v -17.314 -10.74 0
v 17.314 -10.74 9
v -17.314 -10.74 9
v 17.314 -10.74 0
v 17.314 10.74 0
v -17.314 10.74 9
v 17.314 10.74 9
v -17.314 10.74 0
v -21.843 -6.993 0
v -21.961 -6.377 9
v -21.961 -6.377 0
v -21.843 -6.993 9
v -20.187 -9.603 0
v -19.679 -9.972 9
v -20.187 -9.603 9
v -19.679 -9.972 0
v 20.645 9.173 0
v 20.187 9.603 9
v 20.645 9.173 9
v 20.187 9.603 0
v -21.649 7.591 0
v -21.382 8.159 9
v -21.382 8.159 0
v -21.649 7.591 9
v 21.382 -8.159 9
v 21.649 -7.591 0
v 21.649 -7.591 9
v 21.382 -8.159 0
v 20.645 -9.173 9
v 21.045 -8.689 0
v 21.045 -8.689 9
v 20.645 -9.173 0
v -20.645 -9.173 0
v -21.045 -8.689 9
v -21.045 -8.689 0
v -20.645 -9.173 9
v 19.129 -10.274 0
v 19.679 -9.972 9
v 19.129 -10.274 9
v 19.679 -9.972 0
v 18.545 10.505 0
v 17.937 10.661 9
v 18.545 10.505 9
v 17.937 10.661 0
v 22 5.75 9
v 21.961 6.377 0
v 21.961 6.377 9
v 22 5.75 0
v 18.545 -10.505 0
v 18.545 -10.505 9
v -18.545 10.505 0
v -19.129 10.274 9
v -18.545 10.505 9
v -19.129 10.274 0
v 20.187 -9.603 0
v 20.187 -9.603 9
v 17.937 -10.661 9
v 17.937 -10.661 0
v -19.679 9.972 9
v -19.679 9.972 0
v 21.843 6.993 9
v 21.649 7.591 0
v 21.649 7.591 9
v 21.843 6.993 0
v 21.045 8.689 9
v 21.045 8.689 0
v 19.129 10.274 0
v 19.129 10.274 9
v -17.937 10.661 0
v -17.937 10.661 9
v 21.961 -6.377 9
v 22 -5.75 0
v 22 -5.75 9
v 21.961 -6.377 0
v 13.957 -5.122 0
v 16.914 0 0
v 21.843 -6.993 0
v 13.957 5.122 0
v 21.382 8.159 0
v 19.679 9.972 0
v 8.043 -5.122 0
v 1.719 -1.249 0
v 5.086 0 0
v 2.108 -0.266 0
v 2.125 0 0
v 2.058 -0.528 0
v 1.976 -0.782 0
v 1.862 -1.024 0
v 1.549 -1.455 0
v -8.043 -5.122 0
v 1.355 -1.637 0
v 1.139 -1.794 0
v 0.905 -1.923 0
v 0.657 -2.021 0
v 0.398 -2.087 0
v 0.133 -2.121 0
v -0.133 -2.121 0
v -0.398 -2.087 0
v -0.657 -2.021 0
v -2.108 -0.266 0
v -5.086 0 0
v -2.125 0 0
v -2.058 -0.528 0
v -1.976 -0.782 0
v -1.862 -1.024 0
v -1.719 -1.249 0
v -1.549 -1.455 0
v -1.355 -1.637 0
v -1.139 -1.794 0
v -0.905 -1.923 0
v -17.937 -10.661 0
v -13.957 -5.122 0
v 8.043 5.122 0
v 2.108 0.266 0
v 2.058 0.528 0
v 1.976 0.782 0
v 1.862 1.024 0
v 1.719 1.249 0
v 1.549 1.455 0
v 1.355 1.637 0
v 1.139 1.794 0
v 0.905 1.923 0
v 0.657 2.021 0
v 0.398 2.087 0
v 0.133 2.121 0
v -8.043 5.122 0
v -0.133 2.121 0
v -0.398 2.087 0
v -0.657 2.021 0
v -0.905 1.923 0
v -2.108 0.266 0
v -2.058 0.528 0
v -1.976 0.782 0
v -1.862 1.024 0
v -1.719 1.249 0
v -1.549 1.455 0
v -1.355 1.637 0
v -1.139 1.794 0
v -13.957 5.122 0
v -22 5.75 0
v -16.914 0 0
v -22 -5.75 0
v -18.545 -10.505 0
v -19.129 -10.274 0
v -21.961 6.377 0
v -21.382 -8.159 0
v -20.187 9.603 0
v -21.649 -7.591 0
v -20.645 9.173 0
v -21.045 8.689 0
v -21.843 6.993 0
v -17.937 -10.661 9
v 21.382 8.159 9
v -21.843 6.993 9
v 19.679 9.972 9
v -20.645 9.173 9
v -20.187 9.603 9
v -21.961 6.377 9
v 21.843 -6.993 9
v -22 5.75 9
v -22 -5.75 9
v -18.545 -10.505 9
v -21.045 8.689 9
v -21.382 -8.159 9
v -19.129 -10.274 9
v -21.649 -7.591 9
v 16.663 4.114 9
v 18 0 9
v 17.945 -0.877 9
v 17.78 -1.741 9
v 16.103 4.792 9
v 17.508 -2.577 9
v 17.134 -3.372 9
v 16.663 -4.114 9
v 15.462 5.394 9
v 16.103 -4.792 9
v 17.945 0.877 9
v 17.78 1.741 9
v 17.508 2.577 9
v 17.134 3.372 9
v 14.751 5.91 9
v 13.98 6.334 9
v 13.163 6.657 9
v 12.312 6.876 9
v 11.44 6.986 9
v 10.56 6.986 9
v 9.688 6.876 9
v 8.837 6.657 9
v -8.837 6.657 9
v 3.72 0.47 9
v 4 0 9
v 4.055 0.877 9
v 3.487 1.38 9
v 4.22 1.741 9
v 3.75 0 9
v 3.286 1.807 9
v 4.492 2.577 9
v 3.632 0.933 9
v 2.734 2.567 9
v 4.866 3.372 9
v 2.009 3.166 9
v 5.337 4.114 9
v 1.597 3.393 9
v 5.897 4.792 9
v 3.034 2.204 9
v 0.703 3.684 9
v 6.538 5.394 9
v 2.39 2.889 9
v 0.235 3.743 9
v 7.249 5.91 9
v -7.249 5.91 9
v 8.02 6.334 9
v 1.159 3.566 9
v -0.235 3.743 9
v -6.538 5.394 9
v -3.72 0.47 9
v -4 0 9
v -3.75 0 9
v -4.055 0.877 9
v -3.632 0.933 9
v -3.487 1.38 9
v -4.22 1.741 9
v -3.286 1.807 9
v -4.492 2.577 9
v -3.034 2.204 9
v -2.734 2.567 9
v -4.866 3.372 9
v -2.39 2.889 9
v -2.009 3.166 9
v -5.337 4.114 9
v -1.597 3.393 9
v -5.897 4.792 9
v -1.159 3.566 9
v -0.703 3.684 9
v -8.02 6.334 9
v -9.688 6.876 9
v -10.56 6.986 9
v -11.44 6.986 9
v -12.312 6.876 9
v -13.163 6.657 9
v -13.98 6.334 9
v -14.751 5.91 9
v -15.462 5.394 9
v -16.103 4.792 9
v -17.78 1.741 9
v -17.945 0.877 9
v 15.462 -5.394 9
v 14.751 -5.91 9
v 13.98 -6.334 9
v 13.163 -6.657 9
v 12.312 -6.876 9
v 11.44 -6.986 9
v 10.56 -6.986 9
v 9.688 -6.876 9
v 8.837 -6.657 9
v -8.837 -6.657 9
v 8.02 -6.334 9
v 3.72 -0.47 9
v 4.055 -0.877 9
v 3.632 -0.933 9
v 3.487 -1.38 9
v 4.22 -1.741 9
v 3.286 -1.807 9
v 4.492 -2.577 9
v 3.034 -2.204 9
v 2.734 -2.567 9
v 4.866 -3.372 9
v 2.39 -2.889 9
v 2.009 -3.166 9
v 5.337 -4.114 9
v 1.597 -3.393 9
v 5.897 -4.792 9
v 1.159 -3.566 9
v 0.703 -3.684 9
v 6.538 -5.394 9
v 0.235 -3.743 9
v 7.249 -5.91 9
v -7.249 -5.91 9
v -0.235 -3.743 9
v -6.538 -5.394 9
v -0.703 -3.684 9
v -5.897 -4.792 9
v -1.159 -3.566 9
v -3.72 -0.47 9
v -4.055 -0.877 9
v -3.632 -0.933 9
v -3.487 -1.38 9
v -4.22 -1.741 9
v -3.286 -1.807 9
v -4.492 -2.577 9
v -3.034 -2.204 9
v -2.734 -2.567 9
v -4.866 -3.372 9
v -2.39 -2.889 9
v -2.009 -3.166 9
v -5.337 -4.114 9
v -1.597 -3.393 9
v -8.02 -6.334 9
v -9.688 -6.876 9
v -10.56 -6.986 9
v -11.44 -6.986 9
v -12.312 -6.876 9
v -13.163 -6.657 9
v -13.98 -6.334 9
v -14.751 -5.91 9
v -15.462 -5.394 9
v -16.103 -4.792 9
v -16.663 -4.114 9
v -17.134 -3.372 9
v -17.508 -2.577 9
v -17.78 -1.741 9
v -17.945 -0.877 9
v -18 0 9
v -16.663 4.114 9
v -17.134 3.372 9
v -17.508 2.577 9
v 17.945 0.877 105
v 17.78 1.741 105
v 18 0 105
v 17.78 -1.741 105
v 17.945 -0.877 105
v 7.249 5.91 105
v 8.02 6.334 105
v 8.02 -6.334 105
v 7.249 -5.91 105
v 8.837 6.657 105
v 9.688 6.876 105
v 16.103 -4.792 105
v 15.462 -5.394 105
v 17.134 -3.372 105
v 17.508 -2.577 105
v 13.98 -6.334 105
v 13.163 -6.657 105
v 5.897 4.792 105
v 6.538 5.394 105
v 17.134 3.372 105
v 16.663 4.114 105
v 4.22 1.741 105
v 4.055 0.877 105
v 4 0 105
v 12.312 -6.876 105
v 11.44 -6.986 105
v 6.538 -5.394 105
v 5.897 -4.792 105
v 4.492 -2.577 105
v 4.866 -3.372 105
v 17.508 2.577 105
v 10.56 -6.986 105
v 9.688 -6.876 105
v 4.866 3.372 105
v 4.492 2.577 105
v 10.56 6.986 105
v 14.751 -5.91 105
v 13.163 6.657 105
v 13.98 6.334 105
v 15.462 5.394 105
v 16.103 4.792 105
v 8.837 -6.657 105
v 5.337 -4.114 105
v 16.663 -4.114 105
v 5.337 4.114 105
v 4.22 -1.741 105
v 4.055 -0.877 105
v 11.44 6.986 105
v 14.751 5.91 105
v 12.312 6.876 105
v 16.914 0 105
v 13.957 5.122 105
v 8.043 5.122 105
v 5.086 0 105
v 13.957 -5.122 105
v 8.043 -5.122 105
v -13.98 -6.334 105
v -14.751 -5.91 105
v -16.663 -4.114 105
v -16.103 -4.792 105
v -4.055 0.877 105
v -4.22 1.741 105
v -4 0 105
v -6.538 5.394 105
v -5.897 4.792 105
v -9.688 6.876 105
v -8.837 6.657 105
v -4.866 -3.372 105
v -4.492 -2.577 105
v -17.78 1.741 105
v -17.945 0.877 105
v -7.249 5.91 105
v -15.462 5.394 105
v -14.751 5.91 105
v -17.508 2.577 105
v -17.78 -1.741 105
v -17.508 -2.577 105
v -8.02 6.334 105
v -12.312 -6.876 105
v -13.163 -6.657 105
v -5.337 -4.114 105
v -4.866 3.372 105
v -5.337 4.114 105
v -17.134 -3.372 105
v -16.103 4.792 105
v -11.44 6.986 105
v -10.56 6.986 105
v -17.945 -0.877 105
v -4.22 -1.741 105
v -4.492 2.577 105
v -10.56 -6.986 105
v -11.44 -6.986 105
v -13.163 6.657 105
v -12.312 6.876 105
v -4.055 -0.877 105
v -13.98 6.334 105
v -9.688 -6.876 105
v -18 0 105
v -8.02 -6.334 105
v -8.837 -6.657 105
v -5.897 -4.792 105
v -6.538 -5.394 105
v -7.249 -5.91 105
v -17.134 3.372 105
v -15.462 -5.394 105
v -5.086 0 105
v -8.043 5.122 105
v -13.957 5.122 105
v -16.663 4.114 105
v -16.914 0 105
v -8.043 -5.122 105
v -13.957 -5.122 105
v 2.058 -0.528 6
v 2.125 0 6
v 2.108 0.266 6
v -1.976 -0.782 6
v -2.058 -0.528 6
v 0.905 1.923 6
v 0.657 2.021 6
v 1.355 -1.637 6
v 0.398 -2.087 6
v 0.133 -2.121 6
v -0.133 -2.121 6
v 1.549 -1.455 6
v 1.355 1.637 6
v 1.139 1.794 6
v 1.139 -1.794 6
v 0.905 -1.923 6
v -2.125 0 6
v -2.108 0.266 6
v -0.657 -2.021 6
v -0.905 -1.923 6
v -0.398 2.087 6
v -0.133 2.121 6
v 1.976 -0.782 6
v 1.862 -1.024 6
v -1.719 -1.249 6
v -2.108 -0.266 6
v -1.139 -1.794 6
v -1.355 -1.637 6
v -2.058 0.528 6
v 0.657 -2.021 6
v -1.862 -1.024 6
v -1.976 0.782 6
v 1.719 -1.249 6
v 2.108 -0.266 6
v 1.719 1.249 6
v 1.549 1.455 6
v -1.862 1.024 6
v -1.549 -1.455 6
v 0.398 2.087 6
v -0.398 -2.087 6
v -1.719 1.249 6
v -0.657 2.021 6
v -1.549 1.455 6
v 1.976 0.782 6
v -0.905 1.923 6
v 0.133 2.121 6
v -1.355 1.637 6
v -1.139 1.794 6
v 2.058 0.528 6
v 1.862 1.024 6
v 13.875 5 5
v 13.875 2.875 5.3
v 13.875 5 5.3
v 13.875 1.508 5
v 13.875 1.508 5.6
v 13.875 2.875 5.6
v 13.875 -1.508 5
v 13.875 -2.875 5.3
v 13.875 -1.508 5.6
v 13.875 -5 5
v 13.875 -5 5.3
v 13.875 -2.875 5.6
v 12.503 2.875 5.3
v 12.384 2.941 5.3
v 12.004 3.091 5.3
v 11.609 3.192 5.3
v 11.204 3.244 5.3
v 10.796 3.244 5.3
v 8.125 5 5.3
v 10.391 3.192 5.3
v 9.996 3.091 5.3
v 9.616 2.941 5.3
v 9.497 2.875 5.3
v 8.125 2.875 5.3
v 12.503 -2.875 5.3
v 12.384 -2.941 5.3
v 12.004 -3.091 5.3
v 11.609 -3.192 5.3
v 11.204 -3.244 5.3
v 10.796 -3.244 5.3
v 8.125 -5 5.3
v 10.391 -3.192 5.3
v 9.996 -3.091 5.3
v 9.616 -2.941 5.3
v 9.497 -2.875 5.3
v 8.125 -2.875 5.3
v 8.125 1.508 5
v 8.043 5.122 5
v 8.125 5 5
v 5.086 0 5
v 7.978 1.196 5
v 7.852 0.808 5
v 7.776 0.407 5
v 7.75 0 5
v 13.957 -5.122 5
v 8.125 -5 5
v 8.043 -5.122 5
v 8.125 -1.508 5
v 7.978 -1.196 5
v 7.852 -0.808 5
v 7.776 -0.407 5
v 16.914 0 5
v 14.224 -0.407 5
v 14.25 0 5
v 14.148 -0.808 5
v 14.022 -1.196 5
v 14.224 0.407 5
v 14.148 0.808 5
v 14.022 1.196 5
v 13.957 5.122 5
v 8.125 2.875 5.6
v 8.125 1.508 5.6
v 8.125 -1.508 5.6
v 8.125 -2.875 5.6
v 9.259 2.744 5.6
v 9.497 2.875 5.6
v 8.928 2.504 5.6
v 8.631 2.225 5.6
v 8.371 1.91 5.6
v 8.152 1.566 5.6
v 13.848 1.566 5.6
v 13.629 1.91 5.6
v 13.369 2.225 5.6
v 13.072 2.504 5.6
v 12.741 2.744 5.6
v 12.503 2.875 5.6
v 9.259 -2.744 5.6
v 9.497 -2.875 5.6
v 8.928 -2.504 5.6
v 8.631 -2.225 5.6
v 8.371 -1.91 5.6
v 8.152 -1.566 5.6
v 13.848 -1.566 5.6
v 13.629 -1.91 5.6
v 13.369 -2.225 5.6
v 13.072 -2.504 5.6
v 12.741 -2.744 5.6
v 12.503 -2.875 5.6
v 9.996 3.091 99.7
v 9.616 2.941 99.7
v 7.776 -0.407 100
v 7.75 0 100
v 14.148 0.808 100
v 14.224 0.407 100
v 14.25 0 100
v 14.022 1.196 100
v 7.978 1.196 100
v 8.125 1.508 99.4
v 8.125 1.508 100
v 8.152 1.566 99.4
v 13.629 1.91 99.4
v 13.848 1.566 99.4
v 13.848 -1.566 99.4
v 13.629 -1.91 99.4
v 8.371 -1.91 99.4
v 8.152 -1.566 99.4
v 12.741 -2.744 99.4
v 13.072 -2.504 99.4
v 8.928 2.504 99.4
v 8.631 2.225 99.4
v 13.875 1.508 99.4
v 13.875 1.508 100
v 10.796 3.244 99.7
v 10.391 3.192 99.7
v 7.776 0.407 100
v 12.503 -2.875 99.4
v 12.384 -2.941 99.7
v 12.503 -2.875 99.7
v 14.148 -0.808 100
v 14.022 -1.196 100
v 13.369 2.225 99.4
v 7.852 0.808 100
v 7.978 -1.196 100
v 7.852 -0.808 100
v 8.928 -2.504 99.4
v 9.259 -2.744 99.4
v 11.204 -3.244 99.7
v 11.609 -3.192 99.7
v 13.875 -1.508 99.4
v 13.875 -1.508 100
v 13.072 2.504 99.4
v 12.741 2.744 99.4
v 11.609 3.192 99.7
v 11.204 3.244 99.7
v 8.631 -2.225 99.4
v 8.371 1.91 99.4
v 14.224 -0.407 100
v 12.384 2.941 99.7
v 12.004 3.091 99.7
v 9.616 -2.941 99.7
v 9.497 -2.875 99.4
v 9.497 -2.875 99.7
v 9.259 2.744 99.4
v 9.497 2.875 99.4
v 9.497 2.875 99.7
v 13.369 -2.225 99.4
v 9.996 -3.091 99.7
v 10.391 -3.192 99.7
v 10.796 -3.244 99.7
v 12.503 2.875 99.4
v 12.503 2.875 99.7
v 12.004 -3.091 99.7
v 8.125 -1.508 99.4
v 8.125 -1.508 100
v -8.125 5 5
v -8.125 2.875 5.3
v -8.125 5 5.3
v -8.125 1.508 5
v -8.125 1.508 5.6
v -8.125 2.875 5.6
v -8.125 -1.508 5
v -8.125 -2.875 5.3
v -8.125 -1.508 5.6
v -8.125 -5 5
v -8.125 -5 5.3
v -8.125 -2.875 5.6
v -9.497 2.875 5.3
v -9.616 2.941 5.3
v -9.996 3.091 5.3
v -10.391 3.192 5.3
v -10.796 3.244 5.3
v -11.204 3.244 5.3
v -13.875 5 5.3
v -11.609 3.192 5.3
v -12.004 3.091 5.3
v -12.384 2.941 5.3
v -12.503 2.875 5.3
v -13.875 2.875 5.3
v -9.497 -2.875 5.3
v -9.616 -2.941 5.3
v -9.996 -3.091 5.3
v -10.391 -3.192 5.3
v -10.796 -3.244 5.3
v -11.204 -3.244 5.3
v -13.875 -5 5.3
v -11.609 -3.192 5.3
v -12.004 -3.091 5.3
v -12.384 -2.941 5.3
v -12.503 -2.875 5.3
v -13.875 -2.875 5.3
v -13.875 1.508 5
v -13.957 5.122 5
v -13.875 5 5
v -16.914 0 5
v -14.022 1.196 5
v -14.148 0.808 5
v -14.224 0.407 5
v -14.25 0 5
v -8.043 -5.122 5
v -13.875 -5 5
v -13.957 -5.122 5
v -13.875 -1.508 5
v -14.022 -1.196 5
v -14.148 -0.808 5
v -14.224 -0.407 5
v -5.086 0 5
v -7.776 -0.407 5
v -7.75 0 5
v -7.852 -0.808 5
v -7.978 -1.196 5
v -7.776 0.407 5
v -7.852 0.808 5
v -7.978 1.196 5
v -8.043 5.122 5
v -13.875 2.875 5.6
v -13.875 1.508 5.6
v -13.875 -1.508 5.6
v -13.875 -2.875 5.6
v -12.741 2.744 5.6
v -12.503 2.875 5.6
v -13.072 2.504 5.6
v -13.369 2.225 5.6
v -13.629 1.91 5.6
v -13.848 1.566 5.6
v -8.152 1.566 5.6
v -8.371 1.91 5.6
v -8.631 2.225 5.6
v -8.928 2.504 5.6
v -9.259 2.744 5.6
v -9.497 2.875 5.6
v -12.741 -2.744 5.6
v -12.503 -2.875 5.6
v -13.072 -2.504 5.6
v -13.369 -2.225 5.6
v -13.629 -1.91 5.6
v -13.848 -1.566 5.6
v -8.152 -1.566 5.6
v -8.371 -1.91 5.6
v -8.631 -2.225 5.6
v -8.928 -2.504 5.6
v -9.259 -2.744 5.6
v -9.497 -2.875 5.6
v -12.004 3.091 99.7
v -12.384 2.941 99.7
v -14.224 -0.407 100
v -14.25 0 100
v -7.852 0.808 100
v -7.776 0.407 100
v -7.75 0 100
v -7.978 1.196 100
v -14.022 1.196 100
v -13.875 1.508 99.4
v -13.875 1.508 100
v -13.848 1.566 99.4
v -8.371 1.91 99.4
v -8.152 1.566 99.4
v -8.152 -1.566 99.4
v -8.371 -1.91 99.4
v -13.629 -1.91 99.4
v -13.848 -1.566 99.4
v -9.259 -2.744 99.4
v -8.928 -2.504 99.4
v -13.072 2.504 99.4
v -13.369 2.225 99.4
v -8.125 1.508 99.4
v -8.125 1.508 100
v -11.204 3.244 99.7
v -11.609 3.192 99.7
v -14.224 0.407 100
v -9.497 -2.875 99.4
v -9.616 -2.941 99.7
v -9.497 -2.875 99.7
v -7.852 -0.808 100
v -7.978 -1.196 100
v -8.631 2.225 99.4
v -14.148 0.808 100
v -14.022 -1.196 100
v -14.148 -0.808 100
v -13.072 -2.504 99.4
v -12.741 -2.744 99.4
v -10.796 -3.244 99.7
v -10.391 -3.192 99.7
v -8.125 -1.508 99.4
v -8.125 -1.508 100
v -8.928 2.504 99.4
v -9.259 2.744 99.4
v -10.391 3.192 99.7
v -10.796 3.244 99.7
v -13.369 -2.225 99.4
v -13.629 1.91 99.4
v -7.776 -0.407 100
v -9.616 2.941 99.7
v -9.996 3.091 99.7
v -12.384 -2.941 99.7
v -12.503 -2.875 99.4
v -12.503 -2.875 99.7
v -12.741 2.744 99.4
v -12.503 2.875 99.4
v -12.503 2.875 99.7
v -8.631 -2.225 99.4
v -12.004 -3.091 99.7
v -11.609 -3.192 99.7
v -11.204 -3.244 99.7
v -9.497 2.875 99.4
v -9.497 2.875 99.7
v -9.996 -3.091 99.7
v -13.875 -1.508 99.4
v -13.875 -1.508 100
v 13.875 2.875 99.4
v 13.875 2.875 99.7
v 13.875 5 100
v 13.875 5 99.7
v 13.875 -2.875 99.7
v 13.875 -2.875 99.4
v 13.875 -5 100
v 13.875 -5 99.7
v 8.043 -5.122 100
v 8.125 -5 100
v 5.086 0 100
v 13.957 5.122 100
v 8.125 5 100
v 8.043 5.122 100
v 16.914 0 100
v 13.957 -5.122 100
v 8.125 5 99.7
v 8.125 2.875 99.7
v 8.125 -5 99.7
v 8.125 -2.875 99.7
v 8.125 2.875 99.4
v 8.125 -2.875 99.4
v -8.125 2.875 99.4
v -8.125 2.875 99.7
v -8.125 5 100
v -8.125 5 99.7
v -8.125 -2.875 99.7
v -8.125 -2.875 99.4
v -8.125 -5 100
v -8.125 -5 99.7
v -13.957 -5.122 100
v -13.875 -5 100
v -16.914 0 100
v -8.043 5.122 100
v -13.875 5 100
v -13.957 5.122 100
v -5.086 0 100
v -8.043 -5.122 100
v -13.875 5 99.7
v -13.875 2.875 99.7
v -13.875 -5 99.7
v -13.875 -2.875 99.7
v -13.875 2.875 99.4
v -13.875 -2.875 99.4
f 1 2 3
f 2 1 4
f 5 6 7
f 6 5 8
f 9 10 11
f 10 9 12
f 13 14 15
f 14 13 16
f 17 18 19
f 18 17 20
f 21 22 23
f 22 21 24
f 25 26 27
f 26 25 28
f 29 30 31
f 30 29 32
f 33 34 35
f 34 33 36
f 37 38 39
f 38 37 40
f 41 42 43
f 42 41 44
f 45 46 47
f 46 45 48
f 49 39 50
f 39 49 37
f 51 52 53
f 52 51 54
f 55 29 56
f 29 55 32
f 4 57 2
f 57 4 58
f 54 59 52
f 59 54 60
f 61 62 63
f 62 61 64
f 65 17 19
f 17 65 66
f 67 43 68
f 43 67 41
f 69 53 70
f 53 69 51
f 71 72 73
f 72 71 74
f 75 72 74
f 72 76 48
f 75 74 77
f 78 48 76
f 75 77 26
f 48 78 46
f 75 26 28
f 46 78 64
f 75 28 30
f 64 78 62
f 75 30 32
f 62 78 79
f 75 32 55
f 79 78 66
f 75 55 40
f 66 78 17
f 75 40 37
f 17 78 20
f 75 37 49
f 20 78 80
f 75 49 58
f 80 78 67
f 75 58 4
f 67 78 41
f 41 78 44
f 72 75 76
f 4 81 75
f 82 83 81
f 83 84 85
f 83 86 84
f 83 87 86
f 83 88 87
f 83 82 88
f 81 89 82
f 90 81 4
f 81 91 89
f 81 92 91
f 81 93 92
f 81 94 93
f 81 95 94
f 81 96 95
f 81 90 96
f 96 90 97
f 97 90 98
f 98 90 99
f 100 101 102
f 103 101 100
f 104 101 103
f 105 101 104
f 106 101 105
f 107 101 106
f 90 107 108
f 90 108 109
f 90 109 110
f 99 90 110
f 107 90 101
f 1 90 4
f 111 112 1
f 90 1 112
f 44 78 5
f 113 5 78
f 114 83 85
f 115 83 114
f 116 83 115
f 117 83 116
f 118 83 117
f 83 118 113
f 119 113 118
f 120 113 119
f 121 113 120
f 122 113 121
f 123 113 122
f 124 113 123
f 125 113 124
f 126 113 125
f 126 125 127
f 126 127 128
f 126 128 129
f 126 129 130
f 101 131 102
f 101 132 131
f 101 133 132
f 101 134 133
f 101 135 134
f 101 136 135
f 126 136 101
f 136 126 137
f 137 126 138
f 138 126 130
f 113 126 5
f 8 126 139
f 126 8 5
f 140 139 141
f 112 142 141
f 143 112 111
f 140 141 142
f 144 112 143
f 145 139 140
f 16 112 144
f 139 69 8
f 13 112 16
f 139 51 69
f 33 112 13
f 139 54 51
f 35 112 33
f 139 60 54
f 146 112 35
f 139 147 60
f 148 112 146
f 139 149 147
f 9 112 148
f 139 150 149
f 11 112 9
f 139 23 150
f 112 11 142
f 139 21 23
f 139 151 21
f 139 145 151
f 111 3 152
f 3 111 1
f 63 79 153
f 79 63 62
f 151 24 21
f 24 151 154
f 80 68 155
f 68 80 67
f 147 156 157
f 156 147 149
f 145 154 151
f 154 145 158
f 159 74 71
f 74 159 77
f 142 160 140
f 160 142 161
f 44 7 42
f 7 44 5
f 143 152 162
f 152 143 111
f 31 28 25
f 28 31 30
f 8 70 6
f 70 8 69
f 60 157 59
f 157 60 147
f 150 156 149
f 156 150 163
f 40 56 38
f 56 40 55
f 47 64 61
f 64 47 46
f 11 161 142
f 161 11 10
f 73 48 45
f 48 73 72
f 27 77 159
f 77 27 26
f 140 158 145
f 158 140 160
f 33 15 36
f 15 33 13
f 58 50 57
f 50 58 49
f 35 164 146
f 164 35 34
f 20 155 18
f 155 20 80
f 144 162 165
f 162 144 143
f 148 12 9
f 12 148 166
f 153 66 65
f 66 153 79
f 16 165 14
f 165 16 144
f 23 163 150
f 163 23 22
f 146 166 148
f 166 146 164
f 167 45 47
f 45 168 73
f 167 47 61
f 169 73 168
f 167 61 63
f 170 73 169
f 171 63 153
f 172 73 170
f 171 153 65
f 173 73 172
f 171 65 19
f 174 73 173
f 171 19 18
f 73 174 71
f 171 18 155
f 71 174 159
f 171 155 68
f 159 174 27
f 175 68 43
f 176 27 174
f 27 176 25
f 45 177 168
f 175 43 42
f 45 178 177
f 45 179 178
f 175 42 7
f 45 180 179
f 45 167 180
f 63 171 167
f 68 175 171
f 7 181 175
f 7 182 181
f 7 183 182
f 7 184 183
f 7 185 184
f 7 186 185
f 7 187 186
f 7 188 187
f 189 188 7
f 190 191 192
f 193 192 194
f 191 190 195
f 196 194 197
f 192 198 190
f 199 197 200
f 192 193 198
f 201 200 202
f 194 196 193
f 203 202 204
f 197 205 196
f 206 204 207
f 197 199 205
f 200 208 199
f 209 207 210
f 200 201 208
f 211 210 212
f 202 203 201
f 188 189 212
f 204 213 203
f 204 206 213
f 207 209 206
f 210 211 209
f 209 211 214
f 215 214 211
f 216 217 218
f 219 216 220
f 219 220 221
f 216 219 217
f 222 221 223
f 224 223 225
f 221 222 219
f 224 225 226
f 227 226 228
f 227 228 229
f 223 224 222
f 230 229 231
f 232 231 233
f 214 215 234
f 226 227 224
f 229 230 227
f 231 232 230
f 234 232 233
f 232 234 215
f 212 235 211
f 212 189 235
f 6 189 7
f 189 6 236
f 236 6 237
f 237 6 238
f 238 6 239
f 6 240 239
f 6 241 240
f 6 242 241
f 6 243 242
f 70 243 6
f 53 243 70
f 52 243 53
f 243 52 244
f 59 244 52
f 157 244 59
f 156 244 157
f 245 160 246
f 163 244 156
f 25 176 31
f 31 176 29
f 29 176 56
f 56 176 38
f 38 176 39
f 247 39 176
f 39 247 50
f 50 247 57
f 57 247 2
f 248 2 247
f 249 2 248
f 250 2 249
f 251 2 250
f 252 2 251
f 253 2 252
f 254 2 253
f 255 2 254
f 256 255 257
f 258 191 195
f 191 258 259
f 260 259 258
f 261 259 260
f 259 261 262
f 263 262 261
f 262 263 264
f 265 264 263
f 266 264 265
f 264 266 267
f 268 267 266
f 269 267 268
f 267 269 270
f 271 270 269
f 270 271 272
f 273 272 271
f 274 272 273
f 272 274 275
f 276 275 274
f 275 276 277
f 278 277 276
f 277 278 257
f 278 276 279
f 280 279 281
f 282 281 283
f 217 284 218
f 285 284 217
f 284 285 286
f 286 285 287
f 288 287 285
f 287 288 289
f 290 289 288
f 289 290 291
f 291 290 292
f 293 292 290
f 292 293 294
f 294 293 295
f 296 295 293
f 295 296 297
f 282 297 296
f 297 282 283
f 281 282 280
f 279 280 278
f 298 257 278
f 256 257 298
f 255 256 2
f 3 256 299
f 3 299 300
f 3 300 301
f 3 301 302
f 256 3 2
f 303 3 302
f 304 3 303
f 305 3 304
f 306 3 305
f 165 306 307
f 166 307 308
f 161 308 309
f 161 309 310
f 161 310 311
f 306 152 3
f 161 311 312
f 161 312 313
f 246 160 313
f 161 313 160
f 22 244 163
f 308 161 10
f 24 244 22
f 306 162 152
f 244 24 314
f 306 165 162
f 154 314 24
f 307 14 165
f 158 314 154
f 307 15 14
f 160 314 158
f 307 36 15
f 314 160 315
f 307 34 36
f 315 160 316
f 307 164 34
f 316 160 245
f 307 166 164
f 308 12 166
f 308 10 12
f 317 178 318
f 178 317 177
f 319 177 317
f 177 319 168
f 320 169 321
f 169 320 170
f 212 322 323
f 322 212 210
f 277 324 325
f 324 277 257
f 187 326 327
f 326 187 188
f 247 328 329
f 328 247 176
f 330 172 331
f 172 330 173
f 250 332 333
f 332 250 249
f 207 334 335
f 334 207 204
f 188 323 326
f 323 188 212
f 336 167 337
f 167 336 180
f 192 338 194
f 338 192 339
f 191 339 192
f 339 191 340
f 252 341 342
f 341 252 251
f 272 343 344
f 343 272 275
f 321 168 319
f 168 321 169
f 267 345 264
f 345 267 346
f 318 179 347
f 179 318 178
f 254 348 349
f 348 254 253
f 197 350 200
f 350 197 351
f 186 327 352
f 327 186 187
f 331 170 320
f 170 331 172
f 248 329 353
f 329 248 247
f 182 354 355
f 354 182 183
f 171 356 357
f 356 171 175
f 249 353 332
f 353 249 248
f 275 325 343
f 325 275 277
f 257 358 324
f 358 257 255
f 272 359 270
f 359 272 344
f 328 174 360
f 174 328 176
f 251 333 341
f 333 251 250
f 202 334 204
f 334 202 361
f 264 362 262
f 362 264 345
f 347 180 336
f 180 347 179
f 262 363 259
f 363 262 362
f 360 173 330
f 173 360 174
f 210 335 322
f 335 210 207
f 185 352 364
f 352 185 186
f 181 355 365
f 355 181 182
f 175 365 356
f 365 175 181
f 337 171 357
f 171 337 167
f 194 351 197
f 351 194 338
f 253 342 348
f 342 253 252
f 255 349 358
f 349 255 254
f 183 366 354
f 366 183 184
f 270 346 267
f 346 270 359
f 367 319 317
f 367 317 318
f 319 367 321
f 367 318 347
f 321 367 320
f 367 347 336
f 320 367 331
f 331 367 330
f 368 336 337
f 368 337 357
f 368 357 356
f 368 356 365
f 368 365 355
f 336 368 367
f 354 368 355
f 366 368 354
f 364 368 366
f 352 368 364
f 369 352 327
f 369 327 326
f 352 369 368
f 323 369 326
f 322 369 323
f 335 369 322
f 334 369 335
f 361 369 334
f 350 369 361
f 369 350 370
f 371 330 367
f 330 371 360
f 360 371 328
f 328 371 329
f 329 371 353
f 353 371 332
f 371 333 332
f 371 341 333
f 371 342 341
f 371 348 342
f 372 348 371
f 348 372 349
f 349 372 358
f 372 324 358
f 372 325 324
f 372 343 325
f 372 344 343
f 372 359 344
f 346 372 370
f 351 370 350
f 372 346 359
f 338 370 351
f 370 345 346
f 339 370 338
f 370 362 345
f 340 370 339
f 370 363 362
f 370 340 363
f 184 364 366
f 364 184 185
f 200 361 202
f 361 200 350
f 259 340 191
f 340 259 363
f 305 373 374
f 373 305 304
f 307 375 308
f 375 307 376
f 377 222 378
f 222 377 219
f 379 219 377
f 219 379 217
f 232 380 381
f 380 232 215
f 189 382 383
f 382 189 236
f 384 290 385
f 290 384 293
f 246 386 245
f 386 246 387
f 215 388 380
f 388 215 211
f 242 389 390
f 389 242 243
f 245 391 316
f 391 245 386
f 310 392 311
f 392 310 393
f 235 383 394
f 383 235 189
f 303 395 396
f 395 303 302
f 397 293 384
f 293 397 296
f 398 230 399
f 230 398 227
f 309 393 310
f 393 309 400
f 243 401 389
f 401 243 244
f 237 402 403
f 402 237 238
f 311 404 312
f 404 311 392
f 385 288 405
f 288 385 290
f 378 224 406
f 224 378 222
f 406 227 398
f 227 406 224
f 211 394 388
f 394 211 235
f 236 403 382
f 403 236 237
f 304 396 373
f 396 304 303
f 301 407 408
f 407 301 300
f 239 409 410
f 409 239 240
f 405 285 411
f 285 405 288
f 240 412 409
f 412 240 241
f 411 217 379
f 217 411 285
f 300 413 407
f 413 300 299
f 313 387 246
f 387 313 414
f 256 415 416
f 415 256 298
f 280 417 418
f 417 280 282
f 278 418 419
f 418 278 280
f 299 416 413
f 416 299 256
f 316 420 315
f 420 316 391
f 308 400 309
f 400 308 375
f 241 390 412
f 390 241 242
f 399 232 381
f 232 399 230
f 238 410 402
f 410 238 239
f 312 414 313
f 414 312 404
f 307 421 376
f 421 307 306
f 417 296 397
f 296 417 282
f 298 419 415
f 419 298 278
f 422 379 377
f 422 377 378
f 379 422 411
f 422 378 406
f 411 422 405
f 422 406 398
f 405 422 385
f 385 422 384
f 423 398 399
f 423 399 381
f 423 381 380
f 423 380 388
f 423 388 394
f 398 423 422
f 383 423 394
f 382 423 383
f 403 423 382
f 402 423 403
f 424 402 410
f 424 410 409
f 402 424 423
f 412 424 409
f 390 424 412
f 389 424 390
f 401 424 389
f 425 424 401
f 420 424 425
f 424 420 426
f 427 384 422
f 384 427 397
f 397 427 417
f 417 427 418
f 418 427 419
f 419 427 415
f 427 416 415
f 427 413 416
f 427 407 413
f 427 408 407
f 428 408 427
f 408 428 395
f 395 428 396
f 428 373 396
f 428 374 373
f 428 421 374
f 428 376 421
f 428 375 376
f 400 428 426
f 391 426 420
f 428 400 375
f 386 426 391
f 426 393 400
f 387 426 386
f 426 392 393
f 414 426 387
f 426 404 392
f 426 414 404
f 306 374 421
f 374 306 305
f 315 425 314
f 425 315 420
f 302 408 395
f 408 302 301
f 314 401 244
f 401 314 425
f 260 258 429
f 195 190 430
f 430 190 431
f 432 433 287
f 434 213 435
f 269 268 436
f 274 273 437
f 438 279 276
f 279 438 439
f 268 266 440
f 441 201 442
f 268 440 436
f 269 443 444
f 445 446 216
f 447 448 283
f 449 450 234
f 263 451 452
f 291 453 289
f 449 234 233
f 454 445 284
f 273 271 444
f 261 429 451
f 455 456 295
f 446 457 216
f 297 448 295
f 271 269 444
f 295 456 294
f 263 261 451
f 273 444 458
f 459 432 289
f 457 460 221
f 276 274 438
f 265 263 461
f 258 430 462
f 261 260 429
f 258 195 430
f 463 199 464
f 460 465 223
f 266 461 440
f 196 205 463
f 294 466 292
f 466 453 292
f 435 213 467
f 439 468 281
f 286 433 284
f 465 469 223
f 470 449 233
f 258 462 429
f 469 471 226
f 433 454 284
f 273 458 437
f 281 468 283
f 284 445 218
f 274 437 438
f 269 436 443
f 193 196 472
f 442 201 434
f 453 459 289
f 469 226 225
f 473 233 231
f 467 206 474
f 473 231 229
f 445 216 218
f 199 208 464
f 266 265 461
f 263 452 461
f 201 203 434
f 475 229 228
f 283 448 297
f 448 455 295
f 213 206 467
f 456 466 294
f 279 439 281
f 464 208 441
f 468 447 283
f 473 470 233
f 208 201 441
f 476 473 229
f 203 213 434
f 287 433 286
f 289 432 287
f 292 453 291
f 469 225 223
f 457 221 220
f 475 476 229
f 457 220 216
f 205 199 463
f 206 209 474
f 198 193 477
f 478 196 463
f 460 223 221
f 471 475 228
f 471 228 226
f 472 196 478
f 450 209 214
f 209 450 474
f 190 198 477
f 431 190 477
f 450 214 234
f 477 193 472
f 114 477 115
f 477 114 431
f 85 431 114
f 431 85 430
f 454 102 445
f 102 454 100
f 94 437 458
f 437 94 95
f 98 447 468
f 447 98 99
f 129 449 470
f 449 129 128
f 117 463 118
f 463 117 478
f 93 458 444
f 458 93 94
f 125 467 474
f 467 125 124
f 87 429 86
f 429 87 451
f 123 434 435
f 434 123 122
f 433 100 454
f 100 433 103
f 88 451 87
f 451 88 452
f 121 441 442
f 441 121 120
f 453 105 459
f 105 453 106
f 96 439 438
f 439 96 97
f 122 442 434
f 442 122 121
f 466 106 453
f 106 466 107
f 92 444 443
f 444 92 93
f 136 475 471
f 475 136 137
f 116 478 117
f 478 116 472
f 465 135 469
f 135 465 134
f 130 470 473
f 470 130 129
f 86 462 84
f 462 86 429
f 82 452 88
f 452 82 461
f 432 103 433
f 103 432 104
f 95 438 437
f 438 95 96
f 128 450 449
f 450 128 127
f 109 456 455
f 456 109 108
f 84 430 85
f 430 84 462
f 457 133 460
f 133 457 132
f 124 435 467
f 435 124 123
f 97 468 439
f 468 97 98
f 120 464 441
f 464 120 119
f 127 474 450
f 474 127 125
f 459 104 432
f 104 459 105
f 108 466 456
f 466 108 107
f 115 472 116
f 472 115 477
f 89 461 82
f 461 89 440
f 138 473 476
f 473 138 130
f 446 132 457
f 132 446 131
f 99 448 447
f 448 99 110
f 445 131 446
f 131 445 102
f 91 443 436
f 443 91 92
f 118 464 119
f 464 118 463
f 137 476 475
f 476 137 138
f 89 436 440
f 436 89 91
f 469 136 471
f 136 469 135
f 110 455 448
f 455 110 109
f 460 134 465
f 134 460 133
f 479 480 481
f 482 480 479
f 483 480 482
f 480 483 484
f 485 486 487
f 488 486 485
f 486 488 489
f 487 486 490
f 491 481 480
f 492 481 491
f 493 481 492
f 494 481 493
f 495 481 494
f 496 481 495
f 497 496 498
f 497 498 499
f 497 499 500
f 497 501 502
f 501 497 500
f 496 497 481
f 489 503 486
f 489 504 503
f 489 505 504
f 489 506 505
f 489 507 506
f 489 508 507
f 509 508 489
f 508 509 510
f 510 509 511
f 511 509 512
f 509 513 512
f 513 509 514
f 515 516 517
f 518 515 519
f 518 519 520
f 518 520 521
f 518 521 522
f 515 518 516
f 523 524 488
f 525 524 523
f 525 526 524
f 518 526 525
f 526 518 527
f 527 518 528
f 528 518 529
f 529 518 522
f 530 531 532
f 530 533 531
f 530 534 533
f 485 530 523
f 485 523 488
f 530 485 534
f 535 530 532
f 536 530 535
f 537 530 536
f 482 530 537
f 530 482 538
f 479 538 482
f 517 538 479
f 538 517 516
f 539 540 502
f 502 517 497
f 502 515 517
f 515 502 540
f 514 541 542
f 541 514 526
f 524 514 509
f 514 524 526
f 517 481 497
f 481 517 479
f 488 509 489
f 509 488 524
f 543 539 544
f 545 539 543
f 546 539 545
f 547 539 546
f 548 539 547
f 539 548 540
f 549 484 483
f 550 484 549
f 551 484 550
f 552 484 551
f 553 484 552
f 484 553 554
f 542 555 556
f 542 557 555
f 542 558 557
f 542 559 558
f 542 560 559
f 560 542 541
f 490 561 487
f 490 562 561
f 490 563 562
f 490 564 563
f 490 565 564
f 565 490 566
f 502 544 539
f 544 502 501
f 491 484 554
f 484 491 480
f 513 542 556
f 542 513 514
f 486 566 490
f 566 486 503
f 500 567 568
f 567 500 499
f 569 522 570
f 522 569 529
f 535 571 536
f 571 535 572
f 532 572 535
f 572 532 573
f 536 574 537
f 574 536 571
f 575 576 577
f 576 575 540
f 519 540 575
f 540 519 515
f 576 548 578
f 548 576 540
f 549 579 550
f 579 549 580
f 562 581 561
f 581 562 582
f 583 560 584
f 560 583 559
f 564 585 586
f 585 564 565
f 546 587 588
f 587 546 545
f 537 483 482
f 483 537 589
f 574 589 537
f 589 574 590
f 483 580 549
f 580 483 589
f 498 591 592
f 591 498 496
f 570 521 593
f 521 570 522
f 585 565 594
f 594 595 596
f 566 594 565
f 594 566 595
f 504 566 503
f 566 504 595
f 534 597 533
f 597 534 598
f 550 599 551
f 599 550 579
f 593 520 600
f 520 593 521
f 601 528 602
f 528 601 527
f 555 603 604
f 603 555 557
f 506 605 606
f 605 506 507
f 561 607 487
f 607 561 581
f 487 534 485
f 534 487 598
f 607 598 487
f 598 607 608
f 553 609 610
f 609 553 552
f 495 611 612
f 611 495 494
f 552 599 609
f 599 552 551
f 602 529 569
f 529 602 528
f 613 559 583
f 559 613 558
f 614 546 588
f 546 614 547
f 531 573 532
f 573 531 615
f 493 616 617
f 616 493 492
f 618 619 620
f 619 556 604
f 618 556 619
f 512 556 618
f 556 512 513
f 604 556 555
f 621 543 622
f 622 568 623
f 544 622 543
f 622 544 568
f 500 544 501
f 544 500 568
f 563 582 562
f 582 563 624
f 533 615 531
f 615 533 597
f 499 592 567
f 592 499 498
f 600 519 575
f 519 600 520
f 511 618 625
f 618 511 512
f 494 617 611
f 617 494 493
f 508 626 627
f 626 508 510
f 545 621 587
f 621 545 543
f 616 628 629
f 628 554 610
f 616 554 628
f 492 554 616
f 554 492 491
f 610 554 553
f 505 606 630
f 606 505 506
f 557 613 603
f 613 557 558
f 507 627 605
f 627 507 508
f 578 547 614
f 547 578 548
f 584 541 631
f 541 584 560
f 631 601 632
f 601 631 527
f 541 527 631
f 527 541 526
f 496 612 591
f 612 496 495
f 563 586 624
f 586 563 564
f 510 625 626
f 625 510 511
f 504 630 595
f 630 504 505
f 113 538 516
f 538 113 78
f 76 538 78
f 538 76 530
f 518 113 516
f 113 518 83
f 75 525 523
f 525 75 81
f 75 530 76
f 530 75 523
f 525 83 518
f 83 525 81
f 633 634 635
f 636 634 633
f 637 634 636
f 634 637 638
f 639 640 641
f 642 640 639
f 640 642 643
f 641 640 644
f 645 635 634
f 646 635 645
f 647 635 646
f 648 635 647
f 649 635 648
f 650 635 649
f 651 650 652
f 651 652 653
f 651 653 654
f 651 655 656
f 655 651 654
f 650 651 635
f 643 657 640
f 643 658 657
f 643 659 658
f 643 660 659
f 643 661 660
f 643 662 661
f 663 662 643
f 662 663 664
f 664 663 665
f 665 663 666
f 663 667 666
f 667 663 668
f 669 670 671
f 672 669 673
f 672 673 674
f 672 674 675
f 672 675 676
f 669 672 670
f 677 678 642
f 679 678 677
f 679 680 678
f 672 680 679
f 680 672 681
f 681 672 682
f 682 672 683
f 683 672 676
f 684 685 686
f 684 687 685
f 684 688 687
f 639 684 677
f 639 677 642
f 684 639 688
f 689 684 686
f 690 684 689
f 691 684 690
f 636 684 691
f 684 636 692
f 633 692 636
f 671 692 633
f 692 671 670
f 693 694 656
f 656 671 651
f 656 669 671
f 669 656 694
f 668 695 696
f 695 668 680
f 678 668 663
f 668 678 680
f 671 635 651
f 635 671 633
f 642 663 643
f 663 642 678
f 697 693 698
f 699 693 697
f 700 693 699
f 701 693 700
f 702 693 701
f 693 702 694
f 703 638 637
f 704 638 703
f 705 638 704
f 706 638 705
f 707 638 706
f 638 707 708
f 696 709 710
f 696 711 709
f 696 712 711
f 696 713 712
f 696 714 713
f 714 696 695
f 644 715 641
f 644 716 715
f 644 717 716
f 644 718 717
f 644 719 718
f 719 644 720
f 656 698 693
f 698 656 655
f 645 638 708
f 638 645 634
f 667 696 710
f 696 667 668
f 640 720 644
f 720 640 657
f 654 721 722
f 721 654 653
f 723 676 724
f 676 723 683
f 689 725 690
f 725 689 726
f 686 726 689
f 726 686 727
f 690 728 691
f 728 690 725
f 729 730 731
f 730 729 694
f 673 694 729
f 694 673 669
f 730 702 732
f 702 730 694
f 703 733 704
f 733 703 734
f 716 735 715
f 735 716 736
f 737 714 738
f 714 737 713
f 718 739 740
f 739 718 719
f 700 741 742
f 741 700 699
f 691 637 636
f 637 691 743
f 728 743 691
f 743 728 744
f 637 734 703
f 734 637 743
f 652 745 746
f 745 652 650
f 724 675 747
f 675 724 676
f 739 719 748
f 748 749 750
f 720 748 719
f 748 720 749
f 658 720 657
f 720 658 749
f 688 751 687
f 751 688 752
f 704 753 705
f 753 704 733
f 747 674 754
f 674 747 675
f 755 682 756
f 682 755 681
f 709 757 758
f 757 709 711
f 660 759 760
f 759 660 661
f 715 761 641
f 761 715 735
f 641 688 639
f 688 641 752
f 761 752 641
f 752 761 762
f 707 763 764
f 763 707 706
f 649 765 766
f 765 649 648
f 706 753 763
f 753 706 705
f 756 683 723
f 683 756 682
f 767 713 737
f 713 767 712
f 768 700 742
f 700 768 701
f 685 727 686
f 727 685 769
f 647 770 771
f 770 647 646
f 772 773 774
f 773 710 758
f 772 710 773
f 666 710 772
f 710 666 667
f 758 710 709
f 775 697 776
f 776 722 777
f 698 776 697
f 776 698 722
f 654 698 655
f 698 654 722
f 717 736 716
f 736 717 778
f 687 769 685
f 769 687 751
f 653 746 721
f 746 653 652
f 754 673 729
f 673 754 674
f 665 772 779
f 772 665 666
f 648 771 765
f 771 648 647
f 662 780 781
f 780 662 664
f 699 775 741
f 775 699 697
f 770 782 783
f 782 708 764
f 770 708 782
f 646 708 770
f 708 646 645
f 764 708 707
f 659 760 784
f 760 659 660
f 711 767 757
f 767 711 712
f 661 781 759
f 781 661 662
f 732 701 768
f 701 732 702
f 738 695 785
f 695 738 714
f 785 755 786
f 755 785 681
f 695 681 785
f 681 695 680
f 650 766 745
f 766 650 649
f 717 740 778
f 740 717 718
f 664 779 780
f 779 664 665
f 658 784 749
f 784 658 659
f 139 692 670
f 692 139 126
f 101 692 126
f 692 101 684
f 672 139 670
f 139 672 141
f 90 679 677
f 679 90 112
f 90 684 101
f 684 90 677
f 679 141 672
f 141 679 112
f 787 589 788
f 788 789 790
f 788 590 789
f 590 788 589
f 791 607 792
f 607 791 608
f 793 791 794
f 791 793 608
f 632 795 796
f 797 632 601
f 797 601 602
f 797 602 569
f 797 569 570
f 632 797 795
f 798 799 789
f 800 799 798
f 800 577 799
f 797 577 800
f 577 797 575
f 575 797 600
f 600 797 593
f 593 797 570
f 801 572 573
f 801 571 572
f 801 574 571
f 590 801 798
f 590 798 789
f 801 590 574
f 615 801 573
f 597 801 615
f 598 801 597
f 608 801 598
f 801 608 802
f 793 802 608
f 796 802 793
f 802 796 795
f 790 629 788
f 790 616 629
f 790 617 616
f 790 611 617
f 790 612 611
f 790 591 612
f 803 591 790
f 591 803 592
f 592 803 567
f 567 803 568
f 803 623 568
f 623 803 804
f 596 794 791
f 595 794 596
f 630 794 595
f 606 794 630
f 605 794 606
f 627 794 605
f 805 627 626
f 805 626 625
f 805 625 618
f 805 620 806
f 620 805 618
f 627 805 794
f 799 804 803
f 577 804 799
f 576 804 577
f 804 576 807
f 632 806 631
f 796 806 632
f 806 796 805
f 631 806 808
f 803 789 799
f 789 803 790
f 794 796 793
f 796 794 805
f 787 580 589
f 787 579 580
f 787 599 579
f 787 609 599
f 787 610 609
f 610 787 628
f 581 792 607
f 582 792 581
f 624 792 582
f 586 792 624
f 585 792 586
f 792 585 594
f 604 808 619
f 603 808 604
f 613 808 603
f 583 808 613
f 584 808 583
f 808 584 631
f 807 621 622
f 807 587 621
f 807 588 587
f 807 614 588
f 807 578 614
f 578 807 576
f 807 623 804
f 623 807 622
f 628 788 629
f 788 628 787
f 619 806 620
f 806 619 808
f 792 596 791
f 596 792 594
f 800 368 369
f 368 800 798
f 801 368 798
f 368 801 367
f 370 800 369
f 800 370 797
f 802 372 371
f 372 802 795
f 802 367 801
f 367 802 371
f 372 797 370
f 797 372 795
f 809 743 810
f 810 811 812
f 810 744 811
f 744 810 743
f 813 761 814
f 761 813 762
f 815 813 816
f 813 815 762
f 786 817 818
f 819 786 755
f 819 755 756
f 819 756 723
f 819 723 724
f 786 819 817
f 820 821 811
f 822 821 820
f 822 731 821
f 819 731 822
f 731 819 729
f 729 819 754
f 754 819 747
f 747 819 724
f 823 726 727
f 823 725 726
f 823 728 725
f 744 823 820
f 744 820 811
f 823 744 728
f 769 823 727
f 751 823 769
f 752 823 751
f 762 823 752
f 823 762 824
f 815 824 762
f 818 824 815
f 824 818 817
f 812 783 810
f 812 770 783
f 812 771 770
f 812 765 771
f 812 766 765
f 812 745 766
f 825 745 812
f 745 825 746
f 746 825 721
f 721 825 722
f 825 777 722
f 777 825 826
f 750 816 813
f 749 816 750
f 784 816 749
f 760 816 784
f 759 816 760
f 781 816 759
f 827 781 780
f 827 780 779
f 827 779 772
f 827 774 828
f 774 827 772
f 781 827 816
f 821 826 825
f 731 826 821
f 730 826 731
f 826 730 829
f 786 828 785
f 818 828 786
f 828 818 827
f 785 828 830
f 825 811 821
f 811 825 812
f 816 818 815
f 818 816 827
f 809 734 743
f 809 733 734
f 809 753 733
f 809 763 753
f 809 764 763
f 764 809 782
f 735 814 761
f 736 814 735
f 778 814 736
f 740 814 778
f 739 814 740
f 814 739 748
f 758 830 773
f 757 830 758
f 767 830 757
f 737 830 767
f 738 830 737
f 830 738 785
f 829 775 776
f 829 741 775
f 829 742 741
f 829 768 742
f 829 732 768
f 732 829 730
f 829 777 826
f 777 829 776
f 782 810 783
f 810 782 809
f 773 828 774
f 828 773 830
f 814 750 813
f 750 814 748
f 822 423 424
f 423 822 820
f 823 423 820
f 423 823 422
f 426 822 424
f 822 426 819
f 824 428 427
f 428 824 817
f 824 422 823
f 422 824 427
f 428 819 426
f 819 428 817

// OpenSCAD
$fn = 50;


difference() {
	union() {
		hull() {
			translate(v = [-17.0000000000, 5.7500000000, 0]) {
				cylinder(h = 9, r = 5);
			}
			translate(v = [17.0000000000, 5.7500000000, 0]) {
				cylinder(h = 9, r = 5);
			}
			translate(v = [-17.0000000000, -5.7500000000, 0]) {
				cylinder(h = 9, r = 5);
			}
			translate(v = [17.0000000000, -5.7500000000, 0]) {
				cylinder(h = 9, r = 5);
			}
		}
		translate(v = [11.0000000000, 0, 0.0000000000]) {
			cylinder(h = 105, r = 7.0000000000);
		}
		translate(v = [-11.0000000000, 0, 0.0000000000]) {
			cylinder(h = 105, r = 7.0000000000);
		}
	}
	union() {
		translate(v = [0, 0, 9]) {
			rotate(a = [0, 0, 0]) {
				difference() {
					union() {
						#translate(v = [0, 0, -100.0000000000]) {
							cylinder(h = 100, r = 2.0000000000);
						}
						#translate(v = [0, 0, -3]) {
							cylinder(h = 3, r1 = 2.1250000000, r2 = 3.7500000000);
						}
						#translate(v = [0, 0, -100.0000000000]) {
							cylinder(h = 100, r = 2.1250000000);
						}
						#translate(v = [0, 0, -100.0000000000]) {
							cylinder(h = 100, r = 2.0000000000);
						}
					}
					union();
				}
			}
		}
		translate(v = [11.0000000000, 0, 0]) {
			rotate(a = [0, 0, 0]) {
				difference() {
					union() {
						#translate(v = [-2.8750000000, -5.0000000000, -0.3000000000]) {
							cube(size = [5.7500000000, 10, 0.3000000000]);
						}
						#translate(v = [-2.8750000000, -2.8750000000, -0.6000000000]) {
							cube(size = [5.7500000000, 5.7500000000, 0.3000000000]);
						}
						#translate(v = [-2.8750000000, -5.0000000000, 5]) {
							cube(size = [5.7500000000, 10, 0.3000000000]);
						}
						#translate(v = [-2.8750000000, -2.8750000000, 5.3000000000]) {
							cube(size = [5.7500000000, 5.7500000000, 0.3000000000]);
						}
						#translate(v = [0, 0, -100.0000000000]) {
							cylinder(h = 200, r = 3.2500000000);
						}
						#linear_extrude(height = 5) {
							polygon(points = [[5.9142500000, 0.0000000000], [2.9571250000, 5.1218907443], [-2.9571250000, 5.1218907443], [-5.9142500000, 0.0000000000], [-2.9571250000, -5.1218907443], [2.9571250000, -5.1218907443]]);
						}
						#translate(v = [-2.8750000000, -5.0000000000, -0.3000000000]) {
							cube(size = [5.7500000000, 10, 0.3000000000]);
						}
						#translate(v = [-2.8750000000, -2.8750000000, -0.6000000000]) {
							cube(size = [5.7500000000, 5.7500000000, 0.3000000000]);
						}
						#translate(v = [-2.8750000000, -5.0000000000, 5]) {
							cube(size = [5.7500000000, 10, 0.3000000000]);
						}
						#translate(v = [-2.8750000000, -2.8750000000, 5.3000000000]) {
							cube(size = [5.7500000000, 5.7500000000, 0.3000000000]);
						}
						#translate(v = [0, 0, -100.0000000000]) {
							cylinder(h = 200, r = 3.2500000000);
						}
						#translate(v = [-2.8750000000, -5.0000000000, -0.3000000000]) {
							cube(size = [5.7500000000, 10, 0.3000000000]);
						}
						#translate(v = [-2.8750000000, -2.8750000000, -0.6000000000]) {
							cube(size = [5.7500000000, 5.7500000000, 0.3000000000]);
						}
						#translate(v = [-2.8750000000, -5.0000000000, 5]) {
							cube(size = [5.7500000000, 10, 0.3000000000]);
						}
						#translate(v = [-2.8750000000, -2.8750000000, 5.3000000000]) {
							cube(size = [5.7500000000, 5.7500000000, 0.3000000000]);
						}
						#translate(v = [0, 0, -100.0000000000]) {
							cylinder(h = 200, r = 3.2500000000);
						}
					}
					union();
				}
			}
		}
		translate(v = [-11.0000000000, 0, 0]) {
			rotate(a = [0, 0, 0]) {
				difference() {
					union() {
						#translate(v = [-2.8750000000, -5.0000000000, -0.3000000000]) {
							cube(size = [5.7500000000, 10, 0.3000000000]);
						}
						#translate(v = [-2.8750000000, -2.8750000000, -0.6000000000]) {
							cube(size = [5.7500000000, 5.7500000000, 0.3000000000]);
						}
						#translate(v = [-2.8750000000, -5.0000000000, 5]) {
							cube(size = [5.7500000000, 10, 0.3000000000]);
						}
						#translate(v = [-2.8750000000, -2.8750000000, 5.3000000000]) {
							cube(size = [5.7500000000, 5.7500000000, 0.3000000000]);
						}
						#translate(v = [0, 0, -100.0000000000]) {
							cylinder(h = 200, r = 3.2500000000);
						}
						#linear_extrude(height = 5) {
							polygon(points = [[5.9142500000, 0.0000000000], [2.9571250000, 5.1218907443], [-2.9571250000, 5.1218907443], [-5.9142500000, 0.0000000000], [-2.9571250000, -5.1218907443], [2.9571250000, -5.1218907443]]);
						}
						#translate(v = [-2.8750000000, -5.0000000000, -0.3000000000]) {
							cube(size = [5.7500000000, 10, 0.3000000000]);
						}
						#translate(v = [-2.8750000000, -2.8750000000, -0.6000000000]) {
							cube(size = [5.7500000000, 5.7500000000, 0.3000000000]);
						}
						#translate(v = [-2.8750000000, -5.0000000000, 5]) {
							cube(size = [5.7500000000, 10, 0.3000000000]);
						}
						#translate(v = [-2.8750000000, -2.8750000000, 5.3000000000]) {
							cube(size = [5.7500000000, 5.7500000000, 0.3000000000]);
						}
						#translate(v = [0, 0, -100.0000000000]) {
							cylinder(h = 200, r = 3.2500000000);
						}
						#translate(v = [-2.8750000000, -5.0000000000, -0.3000000000]) {
							cube(size = [5.7500000000, 10, 0.3000000000]);
						}
						#translate(v = [-2.8750000000, -2.8750000000, -0.6000000000]) {
							cube(size = [5.7500000000, 5.7500000000, 0.3000000000]);
						}
						#translate(v = [-2.8750000000, -5.0000000000, 5]) {
							cube(size = [5.7500000000, 10, 0.3000000000]);
						}
						#translate(v = [-2.8750000000, -2.8750000000, 5.3000000000]) {
							cube(size = [5.7500000000, 5.7500000000, 0.3000000000]);
						}
						#translate(v = [0, 0, -100.0000000000]) {
							cylinder(h = 200, r = 3.2500000000);
						}
					}
					union();
				}
			}
		}
		translate(v = [11.0000000000, 0, 105]) {
			rotate(a = [0, 0, 0]) {
				difference() {
					union() {
						#translate(v = [-2.8750000000, -5.0000000000, -5.3000000000]) {
							cube(size = [5.7500000000, 10, 0.3000000000]);
						}
						#translate(v = [-2.8750000000, -2.8750000000, -5.6000000000]) {
							cube(size = [5.7500000000, 5.7500000000, 0.3000000000]);
						}
						#translate(v = [-2.8750000000, -5.0000000000, 0]) {
							cube(size = [5.7500000000, 10, 0.3000000000]);
						}
						#translate(v = [-2.8750000000, -2.8750000000, 0.3000000000]) {
							cube(size = [5.7500000000, 5.7500000000, 0.3000000000]);
						}
						#translate(v = [0, 0, -100.0000000000]) {
							cylinder(h = 200, r = 3.2500000000);
						}
						translate(v = [0, 0, -5]) {
							#linear_extrude(height = 5) {
								polygon(points = [[5.9142500000, 0.0000000000], [2.9571250000, 5.1218907443], [-2.9571250000, 5.1218907443], [-5.9142500000, 0.0000000000], [-2.9571250000, -5.1218907443], [2.9571250000, -5.1218907443]]);
							}
						}
						#translate(v = [-2.8750000000, -5.0000000000, -5.3000000000]) {
							cube(size = [5.7500000000, 10, 0.3000000000]);
						}
						#translate(v = [-2.8750000000, -2.8750000000, -5.6000000000]) {
							cube(size = [5.7500000000, 5.7500000000, 0.3000000000]);
						}
						#translate(v = [-2.8750000000, -5.0000000000, 0]) {
							cube(size = [5.7500000000, 10, 0.3000000000]);
						}
						#translate(v = [-2.8750000000, -2.8750000000, 0.3000000000]) {
							cube(size = [5.7500000000, 5.7500000000, 0.3000000000]);
						}
						#translate(v = [0, 0, -100.0000000000]) {
							cylinder(h = 200, r = 3.2500000000);
						}
						#translate(v = [-2.8750000000, -5.0000000000, -5.3000000000]) {
							cube(size = [5.7500000000, 10, 0.3000000000]);
						}
						#translate(v = [-2.8750000000, -2.8750000000, -5.6000000000]) {
							cube(size = [5.7500000000, 5.7500000000, 0.3000000000]);
						}
						#translate(v = [-2.8750000000, -5.0000000000, 0]) {
							cube(size = [5.7500000000, 10, 0.3000000000]);
						}
						#translate(v = [-2.8750000000, -2.8750000000, 0.3000000000]) {
							cube(size = [5.7500000000, 5.7500000000, 0.3000000000]);
						}
						#translate(v = [0, 0, -100.0000000000]) {
							cylinder(h = 200, r = 3.2500000000);
						}
					}
					union();
				}
			}
		}
		translate(v = [-11.0000000000, 0, 105]) {
			rotate(a = [0, 0, 0]) {
				difference() {
					union() {
						#translate(v = [-2.8750000000, -5.0000000000, -5.3000000000]) {
							cube(size = [5.7500000000, 10, 0.3000000000]);
						}
						#translate(v = [-2.8750000000, -2.8750000000, -5.6000000000]) {
							cube(size = [5.7500000000, 5.7500000000, 0.3000000000]);
						}
						#translate(v = [-2.8750000000, -5.0000000000, 0]) {
							cube(size = [5.7500000000, 10, 0.3000000000]);
						}
						#translate(v = [-2.8750000000, -2.8750000000, 0.3000000000]) {
							cube(size = [5.7500000000, 5.7500000000, 0.3000000000]);
						}
						#translate(v = [0, 0, -100.0000000000]) {
							cylinder(h = 200, r = 3.2500000000);
						}
						translate(v = [0, 0, -5]) {
							#linear_extrude(height = 5) {
								polygon(points = [[5.9142500000, 0.0000000000], [2.9571250000, 5.1218907443], [-2.9571250000, 5.1218907443], [-5.9142500000, 0.0000000000], [-2.9571250000, -5.1218907443], [2.9571250000, -5.1218907443]]);
							}
						}
						#translate(v = [-2.8750000000, -5.0000000000, -5.3000000000]) {
							cube(size = [5.7500000000, 10, 0.3000000000]);
						}
						#translate(v = [-2.8750000000, -2.8750000000, -5.6000000000]) {
							cube(size = [5.7500000000, 5.7500000000, 0.3000000000]);
						}
						#translate(v = [-2.8750000000, -5.0000000000, 0]) {
							cube(size = [5.7500000000, 10, 0.3000000000]);
						}
						#translate(v = [-2.8750000000, -2.8750000000, 0.3000000000]) {
							cube(size = [5.7500000000, 5.7500000000, 0.3000000000]);
						}
						#translate(v = [0, 0, -100.0000000000]) {
							cylinder(h = 200, r = 3.2500000000);
						}
						#translate(v = [-2.8750000000, -5.0000000000, -5.3000000000]) {
							cube(size = [5.7500000000, 10, 0.3000000000]);
						}
						#translate(v = [-2.8750000000, -2.8750000000, -5.6000000000]) {
							cube(size = [5.7500000000, 5.7500000000, 0.3000000000]);
						}
						#translate(v = [-2.8750000000, -5.0000000000, 0]) {
							cube(size = [5.7500000000, 10, 0.3000000000]);
						}
						#translate(v = [-2.8750000000, -2.8750000000, 0.3000000000]) {
							cube(size = [5.7500000000, 5.7500000000, 0.3000000000]);
						}
						#translate(v = [0, 0, -100.0000000000]) {
							cylinder(h = 200, r = 3.2500000000);
						}
					}
					union();
				}
			}
		}
	}
}
